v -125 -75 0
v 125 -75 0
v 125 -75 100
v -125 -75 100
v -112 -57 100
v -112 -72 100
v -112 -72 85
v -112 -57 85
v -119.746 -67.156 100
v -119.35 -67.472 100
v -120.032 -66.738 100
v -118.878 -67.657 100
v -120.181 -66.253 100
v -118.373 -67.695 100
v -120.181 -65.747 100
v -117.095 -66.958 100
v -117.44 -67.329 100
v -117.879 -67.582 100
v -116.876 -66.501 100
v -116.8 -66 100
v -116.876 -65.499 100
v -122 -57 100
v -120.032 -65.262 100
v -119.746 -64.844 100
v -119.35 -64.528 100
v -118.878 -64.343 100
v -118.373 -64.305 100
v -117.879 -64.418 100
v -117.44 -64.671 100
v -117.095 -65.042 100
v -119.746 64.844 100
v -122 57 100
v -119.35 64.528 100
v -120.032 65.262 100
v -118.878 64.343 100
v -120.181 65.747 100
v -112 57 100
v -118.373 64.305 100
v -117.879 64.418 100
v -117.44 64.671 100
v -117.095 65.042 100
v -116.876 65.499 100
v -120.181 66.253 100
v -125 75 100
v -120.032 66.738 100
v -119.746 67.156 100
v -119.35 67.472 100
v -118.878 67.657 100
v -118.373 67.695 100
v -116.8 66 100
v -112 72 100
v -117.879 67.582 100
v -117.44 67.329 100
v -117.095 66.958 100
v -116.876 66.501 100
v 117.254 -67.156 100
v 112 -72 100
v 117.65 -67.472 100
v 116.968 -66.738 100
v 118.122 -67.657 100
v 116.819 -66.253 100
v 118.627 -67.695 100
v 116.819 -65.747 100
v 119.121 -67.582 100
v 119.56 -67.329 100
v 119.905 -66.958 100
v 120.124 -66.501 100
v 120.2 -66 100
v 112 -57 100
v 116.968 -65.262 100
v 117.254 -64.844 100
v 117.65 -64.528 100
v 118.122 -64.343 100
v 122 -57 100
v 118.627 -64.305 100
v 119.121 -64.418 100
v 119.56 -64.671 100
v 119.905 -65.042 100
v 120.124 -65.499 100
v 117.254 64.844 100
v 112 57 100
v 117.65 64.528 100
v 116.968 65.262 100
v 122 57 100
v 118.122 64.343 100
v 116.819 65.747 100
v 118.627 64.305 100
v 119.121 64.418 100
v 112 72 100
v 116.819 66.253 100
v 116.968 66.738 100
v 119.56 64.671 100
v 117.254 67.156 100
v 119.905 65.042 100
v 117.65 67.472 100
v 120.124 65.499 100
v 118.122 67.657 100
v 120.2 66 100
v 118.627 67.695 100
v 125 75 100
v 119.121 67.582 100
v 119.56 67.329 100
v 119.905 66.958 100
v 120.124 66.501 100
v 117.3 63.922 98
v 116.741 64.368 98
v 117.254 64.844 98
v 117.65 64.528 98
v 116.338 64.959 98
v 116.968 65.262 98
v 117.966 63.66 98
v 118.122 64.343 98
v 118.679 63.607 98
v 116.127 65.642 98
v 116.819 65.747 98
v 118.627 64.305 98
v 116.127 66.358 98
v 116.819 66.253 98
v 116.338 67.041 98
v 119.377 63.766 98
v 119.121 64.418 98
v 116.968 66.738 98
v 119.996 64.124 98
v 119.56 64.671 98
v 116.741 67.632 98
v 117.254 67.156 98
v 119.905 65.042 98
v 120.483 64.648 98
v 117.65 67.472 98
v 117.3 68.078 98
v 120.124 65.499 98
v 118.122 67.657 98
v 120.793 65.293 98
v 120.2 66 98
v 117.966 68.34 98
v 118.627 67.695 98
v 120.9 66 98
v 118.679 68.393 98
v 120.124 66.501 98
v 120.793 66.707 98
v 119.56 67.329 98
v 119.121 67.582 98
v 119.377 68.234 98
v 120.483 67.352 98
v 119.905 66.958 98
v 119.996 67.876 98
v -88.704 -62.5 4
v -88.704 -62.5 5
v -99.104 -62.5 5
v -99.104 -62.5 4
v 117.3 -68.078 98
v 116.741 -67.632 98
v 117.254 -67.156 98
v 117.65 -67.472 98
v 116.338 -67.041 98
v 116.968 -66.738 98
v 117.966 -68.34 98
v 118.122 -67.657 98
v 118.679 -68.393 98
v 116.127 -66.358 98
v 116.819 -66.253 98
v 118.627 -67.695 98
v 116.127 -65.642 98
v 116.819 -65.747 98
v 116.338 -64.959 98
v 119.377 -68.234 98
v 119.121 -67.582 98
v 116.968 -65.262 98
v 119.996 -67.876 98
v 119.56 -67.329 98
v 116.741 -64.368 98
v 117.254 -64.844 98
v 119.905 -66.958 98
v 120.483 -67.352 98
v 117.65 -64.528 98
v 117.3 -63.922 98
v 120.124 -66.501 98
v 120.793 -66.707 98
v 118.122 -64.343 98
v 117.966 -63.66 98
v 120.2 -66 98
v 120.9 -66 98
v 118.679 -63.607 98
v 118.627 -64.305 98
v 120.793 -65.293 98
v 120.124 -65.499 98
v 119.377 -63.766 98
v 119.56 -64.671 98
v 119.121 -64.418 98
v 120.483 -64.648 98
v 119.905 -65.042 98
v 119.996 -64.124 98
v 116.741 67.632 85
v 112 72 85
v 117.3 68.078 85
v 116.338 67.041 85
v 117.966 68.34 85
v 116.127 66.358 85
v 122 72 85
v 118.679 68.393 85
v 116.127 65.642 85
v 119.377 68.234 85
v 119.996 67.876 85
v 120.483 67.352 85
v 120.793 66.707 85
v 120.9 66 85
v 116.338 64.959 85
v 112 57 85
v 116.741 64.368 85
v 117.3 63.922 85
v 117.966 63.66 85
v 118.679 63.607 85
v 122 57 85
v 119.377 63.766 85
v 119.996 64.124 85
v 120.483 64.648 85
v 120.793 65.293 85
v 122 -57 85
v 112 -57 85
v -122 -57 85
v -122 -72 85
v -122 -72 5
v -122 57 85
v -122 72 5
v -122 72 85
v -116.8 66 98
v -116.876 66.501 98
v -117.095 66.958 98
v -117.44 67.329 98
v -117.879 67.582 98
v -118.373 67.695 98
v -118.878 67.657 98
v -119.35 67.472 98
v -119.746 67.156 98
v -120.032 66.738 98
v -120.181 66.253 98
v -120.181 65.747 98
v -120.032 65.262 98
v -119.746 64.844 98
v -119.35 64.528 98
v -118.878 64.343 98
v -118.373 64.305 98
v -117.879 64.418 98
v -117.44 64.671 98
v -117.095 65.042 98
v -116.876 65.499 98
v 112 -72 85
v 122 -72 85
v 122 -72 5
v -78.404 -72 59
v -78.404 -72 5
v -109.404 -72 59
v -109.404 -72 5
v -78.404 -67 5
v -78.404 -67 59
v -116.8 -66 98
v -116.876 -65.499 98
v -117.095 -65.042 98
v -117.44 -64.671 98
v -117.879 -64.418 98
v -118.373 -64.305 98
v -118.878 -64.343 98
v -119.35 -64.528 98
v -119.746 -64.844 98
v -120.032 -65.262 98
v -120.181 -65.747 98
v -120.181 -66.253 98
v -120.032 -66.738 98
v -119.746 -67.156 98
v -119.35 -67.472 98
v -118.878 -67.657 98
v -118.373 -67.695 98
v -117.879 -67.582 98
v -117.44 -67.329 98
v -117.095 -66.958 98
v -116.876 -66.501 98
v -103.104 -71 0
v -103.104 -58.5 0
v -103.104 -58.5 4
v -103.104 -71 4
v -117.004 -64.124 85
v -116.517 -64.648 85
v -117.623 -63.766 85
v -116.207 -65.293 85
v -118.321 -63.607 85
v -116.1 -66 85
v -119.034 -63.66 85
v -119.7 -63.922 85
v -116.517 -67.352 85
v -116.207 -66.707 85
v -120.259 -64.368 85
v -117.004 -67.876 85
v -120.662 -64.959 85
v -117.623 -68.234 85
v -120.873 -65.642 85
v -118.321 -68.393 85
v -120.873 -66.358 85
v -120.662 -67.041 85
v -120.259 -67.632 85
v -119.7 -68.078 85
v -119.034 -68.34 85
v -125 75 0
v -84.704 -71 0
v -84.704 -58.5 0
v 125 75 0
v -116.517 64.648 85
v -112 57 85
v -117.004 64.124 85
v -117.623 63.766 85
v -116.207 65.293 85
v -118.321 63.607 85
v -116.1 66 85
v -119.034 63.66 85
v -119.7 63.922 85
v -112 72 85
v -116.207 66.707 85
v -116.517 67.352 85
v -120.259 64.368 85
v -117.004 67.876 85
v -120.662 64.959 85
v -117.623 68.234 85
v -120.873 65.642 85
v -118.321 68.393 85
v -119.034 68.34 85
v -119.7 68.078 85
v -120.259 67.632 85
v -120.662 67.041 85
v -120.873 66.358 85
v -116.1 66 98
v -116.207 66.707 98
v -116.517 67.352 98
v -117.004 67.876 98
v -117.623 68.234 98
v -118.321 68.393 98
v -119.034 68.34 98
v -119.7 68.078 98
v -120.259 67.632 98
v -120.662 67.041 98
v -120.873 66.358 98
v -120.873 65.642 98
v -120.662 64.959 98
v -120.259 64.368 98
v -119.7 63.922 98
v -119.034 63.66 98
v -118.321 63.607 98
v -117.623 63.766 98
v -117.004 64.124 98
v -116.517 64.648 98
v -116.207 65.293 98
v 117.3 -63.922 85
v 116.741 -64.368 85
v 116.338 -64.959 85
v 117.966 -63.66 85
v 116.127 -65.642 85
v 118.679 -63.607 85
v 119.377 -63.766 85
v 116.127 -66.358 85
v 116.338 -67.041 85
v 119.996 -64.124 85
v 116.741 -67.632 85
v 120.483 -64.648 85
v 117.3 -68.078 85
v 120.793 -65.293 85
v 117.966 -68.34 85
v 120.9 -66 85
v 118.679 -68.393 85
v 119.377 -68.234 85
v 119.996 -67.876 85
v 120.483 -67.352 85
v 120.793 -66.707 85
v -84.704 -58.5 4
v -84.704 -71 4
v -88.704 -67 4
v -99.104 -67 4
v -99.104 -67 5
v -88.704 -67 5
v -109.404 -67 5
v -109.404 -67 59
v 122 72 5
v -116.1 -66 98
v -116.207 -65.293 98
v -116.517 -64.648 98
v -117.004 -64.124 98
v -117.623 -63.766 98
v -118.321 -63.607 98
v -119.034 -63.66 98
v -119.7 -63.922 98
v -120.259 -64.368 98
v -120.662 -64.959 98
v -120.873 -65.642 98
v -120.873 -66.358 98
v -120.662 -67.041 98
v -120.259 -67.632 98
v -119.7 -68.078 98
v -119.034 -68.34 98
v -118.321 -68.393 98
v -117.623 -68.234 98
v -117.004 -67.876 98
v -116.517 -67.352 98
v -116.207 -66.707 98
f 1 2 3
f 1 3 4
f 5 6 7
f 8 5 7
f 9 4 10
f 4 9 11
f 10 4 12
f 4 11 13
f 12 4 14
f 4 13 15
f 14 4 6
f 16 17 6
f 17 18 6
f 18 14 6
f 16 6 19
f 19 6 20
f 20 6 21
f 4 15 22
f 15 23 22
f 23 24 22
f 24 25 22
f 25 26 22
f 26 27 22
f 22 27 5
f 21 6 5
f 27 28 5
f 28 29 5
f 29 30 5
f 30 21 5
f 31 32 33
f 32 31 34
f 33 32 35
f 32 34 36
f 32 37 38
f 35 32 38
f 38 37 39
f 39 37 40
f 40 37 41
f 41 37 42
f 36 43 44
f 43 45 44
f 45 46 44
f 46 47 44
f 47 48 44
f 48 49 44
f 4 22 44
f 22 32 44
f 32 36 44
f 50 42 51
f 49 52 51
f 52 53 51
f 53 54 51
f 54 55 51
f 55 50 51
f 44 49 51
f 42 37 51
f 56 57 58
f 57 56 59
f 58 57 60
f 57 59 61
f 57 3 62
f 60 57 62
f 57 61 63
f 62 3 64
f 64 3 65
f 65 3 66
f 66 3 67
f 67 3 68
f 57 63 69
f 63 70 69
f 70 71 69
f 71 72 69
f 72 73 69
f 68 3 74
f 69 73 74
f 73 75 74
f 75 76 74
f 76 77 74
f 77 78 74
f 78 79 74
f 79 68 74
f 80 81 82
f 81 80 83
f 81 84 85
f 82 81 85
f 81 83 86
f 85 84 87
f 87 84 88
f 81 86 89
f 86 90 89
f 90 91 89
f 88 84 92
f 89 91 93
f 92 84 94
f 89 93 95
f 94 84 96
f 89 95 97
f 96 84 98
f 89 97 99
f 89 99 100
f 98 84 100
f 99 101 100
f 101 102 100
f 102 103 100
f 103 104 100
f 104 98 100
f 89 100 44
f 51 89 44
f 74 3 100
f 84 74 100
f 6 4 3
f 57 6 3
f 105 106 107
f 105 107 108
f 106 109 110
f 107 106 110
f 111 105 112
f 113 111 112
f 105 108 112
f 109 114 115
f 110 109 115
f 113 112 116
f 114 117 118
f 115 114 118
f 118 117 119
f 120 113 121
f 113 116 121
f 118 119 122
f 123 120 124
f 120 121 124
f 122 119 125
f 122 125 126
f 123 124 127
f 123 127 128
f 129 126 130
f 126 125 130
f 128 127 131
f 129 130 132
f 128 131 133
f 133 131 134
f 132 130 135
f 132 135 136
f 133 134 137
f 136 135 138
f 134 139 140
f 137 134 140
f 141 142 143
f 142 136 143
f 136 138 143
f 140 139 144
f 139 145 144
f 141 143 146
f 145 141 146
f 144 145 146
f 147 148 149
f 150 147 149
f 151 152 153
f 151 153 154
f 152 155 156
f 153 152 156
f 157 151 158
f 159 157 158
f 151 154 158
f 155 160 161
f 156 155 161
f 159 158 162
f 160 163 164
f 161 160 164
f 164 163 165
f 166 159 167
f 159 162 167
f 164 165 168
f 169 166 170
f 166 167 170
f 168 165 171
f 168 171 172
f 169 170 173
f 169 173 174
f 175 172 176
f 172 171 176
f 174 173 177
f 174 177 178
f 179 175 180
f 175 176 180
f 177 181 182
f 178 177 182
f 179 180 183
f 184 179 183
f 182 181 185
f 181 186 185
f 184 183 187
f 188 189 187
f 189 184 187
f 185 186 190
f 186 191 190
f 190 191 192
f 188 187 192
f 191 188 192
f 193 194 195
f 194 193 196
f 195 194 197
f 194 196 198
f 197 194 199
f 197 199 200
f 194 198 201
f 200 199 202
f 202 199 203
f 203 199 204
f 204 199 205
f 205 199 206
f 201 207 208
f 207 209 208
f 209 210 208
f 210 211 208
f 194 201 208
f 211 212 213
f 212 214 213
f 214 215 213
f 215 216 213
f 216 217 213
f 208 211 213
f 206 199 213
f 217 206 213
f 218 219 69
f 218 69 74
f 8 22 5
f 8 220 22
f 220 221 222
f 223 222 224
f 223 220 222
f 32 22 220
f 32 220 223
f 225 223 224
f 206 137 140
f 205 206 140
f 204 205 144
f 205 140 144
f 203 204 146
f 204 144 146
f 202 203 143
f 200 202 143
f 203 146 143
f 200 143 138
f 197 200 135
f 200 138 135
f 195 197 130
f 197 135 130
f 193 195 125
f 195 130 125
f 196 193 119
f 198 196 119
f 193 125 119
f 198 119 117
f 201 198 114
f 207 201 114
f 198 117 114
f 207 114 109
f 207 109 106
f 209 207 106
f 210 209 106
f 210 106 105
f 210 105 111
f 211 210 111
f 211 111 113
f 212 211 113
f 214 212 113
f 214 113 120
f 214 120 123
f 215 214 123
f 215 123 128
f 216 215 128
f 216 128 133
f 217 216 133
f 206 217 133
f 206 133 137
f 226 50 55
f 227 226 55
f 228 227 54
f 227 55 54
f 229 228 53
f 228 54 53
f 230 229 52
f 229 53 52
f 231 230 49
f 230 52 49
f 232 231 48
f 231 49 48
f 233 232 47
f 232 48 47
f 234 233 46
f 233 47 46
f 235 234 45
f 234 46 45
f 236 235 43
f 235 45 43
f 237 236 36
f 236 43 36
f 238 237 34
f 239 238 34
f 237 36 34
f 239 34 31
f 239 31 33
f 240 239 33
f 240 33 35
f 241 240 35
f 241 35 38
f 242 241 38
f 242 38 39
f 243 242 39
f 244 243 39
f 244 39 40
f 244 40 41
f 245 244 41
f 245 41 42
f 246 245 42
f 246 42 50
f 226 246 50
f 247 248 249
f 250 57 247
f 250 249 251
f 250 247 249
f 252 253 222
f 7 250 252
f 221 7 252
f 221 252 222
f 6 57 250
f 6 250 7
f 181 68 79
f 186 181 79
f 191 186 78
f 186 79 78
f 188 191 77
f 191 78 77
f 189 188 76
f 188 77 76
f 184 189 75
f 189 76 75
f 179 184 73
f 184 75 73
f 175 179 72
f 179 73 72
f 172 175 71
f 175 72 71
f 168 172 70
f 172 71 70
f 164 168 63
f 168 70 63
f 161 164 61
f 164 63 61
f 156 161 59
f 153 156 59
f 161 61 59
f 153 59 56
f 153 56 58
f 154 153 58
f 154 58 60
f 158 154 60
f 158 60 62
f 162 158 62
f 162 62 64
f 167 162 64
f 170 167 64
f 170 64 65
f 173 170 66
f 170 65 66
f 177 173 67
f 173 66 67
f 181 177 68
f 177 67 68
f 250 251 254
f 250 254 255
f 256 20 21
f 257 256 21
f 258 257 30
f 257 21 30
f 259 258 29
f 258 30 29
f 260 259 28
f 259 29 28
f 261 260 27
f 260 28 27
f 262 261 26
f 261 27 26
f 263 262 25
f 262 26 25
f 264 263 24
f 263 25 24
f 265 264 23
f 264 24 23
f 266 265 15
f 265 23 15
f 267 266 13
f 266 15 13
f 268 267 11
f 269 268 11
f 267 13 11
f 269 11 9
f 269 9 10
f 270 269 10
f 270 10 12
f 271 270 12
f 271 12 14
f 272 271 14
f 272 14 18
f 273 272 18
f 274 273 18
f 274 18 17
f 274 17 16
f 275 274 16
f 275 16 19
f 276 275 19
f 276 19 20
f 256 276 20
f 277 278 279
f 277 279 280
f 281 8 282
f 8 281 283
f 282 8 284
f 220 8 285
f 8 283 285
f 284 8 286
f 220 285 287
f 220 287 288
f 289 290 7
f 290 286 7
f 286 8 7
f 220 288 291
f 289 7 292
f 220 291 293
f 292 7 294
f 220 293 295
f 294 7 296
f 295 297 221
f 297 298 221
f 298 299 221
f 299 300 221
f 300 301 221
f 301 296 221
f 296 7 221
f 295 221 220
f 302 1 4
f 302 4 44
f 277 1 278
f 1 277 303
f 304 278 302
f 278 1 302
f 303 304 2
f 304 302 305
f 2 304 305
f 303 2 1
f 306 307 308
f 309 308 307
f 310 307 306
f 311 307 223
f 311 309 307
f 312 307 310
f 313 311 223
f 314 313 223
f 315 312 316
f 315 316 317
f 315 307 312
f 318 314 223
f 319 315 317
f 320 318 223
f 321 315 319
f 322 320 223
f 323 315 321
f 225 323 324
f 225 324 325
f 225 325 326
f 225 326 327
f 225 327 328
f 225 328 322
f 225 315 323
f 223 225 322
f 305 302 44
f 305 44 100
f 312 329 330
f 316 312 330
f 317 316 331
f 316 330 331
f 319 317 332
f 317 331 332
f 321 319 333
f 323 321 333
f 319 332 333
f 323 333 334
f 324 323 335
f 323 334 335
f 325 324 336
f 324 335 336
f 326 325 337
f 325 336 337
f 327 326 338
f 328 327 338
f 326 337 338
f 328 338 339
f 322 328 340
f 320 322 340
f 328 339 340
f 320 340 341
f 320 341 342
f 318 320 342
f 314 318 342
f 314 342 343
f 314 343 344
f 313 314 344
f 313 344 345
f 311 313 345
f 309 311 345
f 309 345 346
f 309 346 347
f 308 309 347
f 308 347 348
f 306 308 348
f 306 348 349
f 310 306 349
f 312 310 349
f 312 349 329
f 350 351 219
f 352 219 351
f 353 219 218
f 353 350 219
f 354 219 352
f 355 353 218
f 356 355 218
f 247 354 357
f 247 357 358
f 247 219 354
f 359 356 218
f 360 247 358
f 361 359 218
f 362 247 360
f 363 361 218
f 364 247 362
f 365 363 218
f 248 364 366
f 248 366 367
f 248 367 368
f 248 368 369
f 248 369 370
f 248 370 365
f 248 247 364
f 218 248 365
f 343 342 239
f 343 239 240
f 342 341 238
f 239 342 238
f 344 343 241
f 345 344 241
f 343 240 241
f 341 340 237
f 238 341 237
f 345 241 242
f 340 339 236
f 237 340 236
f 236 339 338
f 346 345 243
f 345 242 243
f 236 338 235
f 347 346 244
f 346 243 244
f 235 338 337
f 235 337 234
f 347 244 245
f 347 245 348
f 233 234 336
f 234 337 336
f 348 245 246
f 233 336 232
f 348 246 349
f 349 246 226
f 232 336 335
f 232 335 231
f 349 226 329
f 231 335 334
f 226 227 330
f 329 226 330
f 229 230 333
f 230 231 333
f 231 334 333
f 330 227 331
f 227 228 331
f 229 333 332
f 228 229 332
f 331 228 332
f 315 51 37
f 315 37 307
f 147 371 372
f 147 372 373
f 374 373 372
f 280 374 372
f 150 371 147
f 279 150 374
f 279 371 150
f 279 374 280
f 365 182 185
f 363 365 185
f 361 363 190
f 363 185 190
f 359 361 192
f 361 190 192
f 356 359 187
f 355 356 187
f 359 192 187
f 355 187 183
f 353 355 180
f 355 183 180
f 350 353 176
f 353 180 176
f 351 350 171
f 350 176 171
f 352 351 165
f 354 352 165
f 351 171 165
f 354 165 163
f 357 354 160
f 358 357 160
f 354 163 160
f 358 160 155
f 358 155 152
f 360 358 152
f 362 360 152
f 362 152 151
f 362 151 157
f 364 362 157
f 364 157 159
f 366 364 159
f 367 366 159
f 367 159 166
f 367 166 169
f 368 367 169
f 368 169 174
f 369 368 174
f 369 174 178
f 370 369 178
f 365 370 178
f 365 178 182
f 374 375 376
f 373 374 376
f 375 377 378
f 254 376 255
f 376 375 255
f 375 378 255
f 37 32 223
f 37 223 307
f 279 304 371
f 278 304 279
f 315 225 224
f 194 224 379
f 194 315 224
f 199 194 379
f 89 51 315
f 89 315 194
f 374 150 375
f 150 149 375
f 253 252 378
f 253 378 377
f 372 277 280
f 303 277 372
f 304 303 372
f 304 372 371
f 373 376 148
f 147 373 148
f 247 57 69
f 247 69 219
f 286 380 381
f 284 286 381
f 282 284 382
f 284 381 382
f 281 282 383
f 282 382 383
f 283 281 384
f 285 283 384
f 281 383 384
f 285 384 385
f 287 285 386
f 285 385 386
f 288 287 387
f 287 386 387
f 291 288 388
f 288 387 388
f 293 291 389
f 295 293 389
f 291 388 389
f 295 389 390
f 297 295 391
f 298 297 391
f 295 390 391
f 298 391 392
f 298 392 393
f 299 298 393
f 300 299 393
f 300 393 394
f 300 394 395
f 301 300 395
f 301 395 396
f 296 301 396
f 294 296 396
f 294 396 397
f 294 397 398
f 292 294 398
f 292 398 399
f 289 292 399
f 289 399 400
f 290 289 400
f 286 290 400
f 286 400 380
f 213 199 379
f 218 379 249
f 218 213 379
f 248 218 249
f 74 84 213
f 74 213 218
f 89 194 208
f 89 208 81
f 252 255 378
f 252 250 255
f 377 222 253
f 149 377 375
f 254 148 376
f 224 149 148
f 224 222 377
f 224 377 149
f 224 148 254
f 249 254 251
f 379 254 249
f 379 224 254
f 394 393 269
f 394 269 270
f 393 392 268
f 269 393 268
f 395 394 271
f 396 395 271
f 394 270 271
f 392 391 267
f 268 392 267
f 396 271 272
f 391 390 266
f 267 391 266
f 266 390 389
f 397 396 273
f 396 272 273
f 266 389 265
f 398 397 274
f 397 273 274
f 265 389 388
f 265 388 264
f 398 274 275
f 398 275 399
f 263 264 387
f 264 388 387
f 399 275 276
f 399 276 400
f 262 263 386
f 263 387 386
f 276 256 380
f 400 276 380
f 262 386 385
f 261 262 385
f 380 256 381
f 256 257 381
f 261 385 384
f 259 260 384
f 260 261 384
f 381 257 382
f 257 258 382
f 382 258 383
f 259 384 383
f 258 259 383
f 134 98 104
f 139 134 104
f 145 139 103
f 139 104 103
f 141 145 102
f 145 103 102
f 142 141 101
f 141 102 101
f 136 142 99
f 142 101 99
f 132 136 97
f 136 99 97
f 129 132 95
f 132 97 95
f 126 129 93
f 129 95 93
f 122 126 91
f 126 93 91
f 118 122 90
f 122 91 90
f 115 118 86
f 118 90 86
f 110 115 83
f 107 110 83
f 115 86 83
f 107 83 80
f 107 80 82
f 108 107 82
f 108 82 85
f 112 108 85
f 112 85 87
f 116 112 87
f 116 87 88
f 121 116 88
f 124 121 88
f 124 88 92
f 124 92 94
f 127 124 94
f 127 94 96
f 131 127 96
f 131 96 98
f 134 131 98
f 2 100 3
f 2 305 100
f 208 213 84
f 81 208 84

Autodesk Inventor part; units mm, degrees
ref_plane "YZ Plane" through (0, 0, 0) normal (1, 0, 0) x (0, 1, 0)
ref_plane "XZ Plane" through (0, 0, 0) normal (0, 1, 0) x (-1, 0, 0)
ref_plane "XY Plane" through (0, 0, 0) normal (0, 0, 1) x (1, 0, 0)
sketch "Sketch7" plane through (0, 0, 0) normal (0, 0, 1) x (1, 0, 0)
  line L0 (125, -75) -> (-125, -75)
  line L1 (-125, -75) -> (-125, 75)
  line L2 (-125, 75) -> (125, 75)
  line L3 (125, 75) -> (125, -75)
  line L4 (125, -75) -> (-125, 75) construction
  line L5 (-125, -75) -> (125, 75) construction
  point P0 (0, 0)
  dimension "d15" = 250
  dimension "d16" = 150
extrude "Box Outside" add sketch "Sketch7" along normal blind 100
sketch "Sketch8" plane through (0, 0, 100) normal (0, 0, 1) x (1, 0, 0)
  line L0 (-122, 72) -> (122, 72)
  line L1 (122, 72) -> (122, -72)
  line L2 (122, -72) -> (-122, -72)
  line L3 (-122, -72) -> (-122, 72)
  line L4 (125, 75) -> (-125, 75) projected
  line L5 (-125, 75) -> (-125, -75) projected
  line L6 (-125, -75) -> (125, -75) projected
  line L7 (125, -75) -> (125, 75) projected
  point P0 (0, 0)
  dimension "d19" = 3
  dimension "d20" = 3
  dimension "d21" = 3
  dimension "d22" = 3
extrude "Box Cut" cut sketch "Sketch8" against normal blind 95 contours L0 L1 L2 L3
sketch "Sketch9" plane through (-122, -72, 100) normal (0, 1, 0) x (1, 0, 0)
  line L0 (0, 0) -> (10, 0)
  line L1 (10, 0) -> (10, 15)
  line L2 (10, 15) -> (0, 15)
  line L3 (0, 15) -> (0, 0)
  point P0 (122, 100)
  dimension "d25" = 10
  dimension "d26" = 15
extrude "ScrewHole Box LB" add sketch "Sketch9" along normal blind 15
sketch "Sketch10" plane through (-122, -72, 5) normal (0, 1, 0) x (1, 0, 0)
  line L0 (244, -95) -> (244, 0) projected
  line L1 (244, -95) -> (234, -95)
  line L2 (234, -95) -> (234, -80)
  line L3 (234, -80) -> (244, -80)
  line L4 (244, -80) -> (244, -95)
  point P0 (122, 5)
  dimension "d29" = 10
  dimension "d30" = 15
extrude "ScrewHole Box RB" add sketch "Sketch10" along normal blind 15
sketch "Sketch11" plane through (-122, 72, 100) normal (0, -1, 0) x (1, 0, 0)
  line L0 (0, 0) -> (244, 0) projected
  line L1 (0, 0) -> (10, 0)
  line L2 (10, 0) -> (10, -15)
  line L3 (10, -15) -> (0, -15)
  line L4 (0, -15) -> (0, 0)
  point P0 (122, -100)
  dimension "d33" = 10
  dimension "d34" = 15
extrude "ScrewHole Box LU" add sketch "Sketch11" along normal blind 15
sketch "Sketch13" plane through (122, -72, 5) normal (-1, 0, 0) x (0, 0, 1)
  line L0 (95, 144) -> (0, 144) projected
  line L1 (95, 144) -> (80, 144)
  line L2 (80, 144) -> (80, 129)
  line L3 (80, 129) -> (95, 129)
  line L4 (95, 129) -> (95, 144)
  point P0 (-5, 72)
  dimension "d37" = 15
  dimension "d38" = 15
extrude "ScrewHole Box RU" add sketch "Sketch13" along normal blind 10
sketch "Sketch27" plane through (0, 0, 100) normal (0, 0, 1) x (1, 0, 0)
  line L0 (-112, -72) -> (-112, -57) projected
  line L1 (-125, 75) -> (-125, -75) projected
  line L2 (-112, -57) -> (-125, -57)
  line L3 (-125, -57) -> (-125, -75)
  line L4 (-125, -75) -> (-112, -75)
  line L5 (-112, -75) -> (-112, -57)
  line L6 (-112, -57) -> (-125, -75)
  line L7 (-112, -75) -> (-125, -57)
  circle A0 centre (-118.5, -66) radius 2.4
  point P0 (0, 0)
  dimension "d84" = 4.8
extrude "Outside ScrewHole LB" cut sketch "Sketch27" against normal blind 26 contours A0 L7 L6 | L6 L7 A0 | A0 L6 L7 | L7 L6 A0
sketch "Sketch29" plane through (0, 0, 100) normal (0, 0, 1) x (1, 0, 0)
  line L0 (-112, -72) -> (-112, -57) projected
  line L1 (-125, -75) -> (125, -75) projected
  line L2 (-112, -57) -> (-125, -57)
  line L3 (-125, -57) -> (-125, -75)
  line L4 (-125, -75) -> (-112, -75)
  line L5 (-112, -75) -> (-112, -57)
  line L6 (-112, -57) -> (-125, -75)
  circle A0 centre (-118.5, -66) radius 2.4
  point P0 (0, 0)
extrude "ScrewRibbon LB" add sketch "Sketch29" against normal blind 2 contours A0 L6 | L6 A0
sketch "Sketch30" plane through (0, 0, 100) normal (0, 0, 1) x (1, 0, 0)
  line L0 (-122, -57) -> (-112, -57) projected
  line L1 (-125, -75) -> (125, -75) projected
  line L2 (-112, -57) -> (-125, -57)
  line L3 (-125, -57) -> (-125, -75)
  line L4 (-125, -75) -> (-112, -75)
  line L5 (-112, -75) -> (-112, -57)
  line L6 (-112, -57) -> (-125, -75)
  circle A0 centre (-118.5, -66) radius 1.7
  point P0 (0, 0)
  dimension "d92" = 3.4
extrude "Inside ScrewHole LB" cut sketch "Sketch30" against normal blind 24 contours A0 L6 | L6 A0
sketch "Sketch31" plane through (0, 0, 100) normal (0, 0, 1) x (1, 0, 0)
  line L0 (-125, 75) -> (-125, -75) projected
  line L1 (-112, 57) -> (-122, 57) projected
  line L2 (-125, 75) -> (-112, 75)
  line L3 (-112, 75) -> (-112, 57)
  line L4 (-112, 57) -> (-125, 57)
  line L5 (-125, 57) -> (-125, 75)
  line L6 (-125, 75) -> (-112, 57)
  circle A0 centre (-118.5, 66) radius 2.4
  point P0 (0, 0)
  dimension "d95" = 4.8
extrude "Outside ScrewHole LU" cut sketch "Sketch31" against normal blind 24 contours A0 L6 | L6 A0
sketch "Sketch32" plane through (0, 0, 100) normal (0, 0, 1) x (1, 0, 0)
  line L0 (-122, 57) -> (-112, 57) projected
  line L1 (-125, 75) -> (-125, -75) projected
  line L2 (-112, 57) -> (-125, 57)
  line L3 (-125, 57) -> (-125, 75)
  line L4 (-125, 75) -> (-112, 75)
  line L5 (-112, 75) -> (-112, 57)
  line L6 (-112, 75) -> (-125, 57)
  circle A0 centre (-118.5, 66) radius 2.4
  point P0 (0, 0)
  dimension "d98" = 4.8
extrude "ScrewRibbon LU" add sketch "Sketch32" against normal blind 2 contours A0 L6 | L6 A0
sketch "Sketch33" plane through (0, 0, 100) normal (0, 0, 1) x (1, 0, 0)
  line L0 (125, 75) -> (-125, 75) projected
  line L1 (-112, 57) -> (-122, 57) projected
  line L2 (-125, 75) -> (-112, 75)
  line L3 (-112, 75) -> (-112, 57)
  line L4 (-112, 57) -> (-125, 57)
  line L5 (-125, 57) -> (-125, 75)
  line L6 (-125, 75) -> (-112, 57)
  circle A0 centre (-118.5, 66) radius 1.7
  point P0 (0, 0)
  dimension "d101" = 3.4
extrude "Inside ScrewHole LU" cut sketch "Sketch33" against normal blind 21.75 contours A0 L6 | L6 A0
sketch "Sketch34" plane through (0, 0, 100) normal (0, 0, 1) x (1, 0, 0)
  line L0 (112, 57) -> (112, 72) projected
  line L1 (125, 75) -> (-125, 75) projected
  line L2 (112, 57) -> (125, 57)
  line L3 (125, 57) -> (125, 75)
  line L4 (125, 75) -> (112, 75)
  line L5 (112, 75) -> (112, 57)
  line L6 (125, 75) -> (112, 57)
  circle A0 centre (118.5, 66) radius 2.4
  point P0 (0, 0)
  dimension "d104" = 4.8
extrude "Outside ScrewHole RU" cut sketch "Sketch34" against normal blind 21.75 contours A0 L6 | L6 A0
sketch "Sketch35" plane through (0, 0, 100) normal (0, 0, 1) x (1, 0, 0)
  line L0 (125, -75) -> (125, 75) projected
  line L1 (122, 57) -> (112, 57) projected
  line L2 (125, 75) -> (112, 75)
  line L3 (112, 75) -> (112, 57)
  line L4 (112, 57) -> (125, 57)
  line L5 (125, 57) -> (125, 75)
  line L6 (125, 75) -> (-125, 75) projected
  line L7 (125, 75) -> (112, 57)
  circle A0 centre (118.5, 66) radius 2.4
  point P0 (0, 0)
  dimension "d107" = 4.8
extrude "ScrewRibbon RU" add sketch "Sketch35" against normal blind 2 contours A0 L7 | L7 A0
sketch "Sketch36" plane through (0, 0, 100) normal (0, 0, 1) x (1, 0, 0)
  line L0 (122, 57) -> (112, 57) projected
  line L1 (125, -75) -> (125, 75) projected
  line L2 (112, 57) -> (125, 57)
  line L3 (125, 57) -> (125, 75)
  line L4 (125, 75) -> (112, 75)
  line L5 (112, 75) -> (112, 57)
  line L6 (112, 57) -> (125, 75)
  circle A0 centre (118.5, 66) radius 2.4 projected
  circle A1 centre (118.5, 66) radius 1.7
  point P0 (0, 0)
  dimension "d110" = 3.4
extrude "Inside ScrewHole RU" cut sketch "Sketch36" against normal blind 20 contours A1 L6 | L6 A1
sketch "Sketch37" plane through (0, 0, 100) normal (0, 0, 1) x (1, 0, 0)
  line L0 (125, -75) -> (125, 75) projected
  line L1 (112, -72) -> (112, -57) projected
  line L2 (125, -75) -> (112, -75)
  line L3 (112, -75) -> (112, -57)
  line L4 (112, -57) -> (125, -57)
  line L5 (125, -57) -> (125, -75)
  line L6 (112, -75) -> (125, -57)
  circle A0 centre (118.5, -66) radius 2.4
  point P0 (0, 0)
  dimension "d113" = 4.8
extrude "Outside ScrewHole RB" cut sketch "Sketch37" against normal blind 20 contours A0 L6 | L6 A0
sketch "Sketch38" plane through (0, 0, 100) normal (0, 0, 1) x (1, 0, 0)
  line L0 (122, -57) -> (112, -57) projected
  line L1 (125, -75) -> (125, 75) projected
  line L2 (112, -57) -> (125, -57)
  line L3 (125, -57) -> (125, -75)
  line L4 (125, -75) -> (112, -75)
  line L5 (112, -75) -> (112, -57)
  line L6 (125, -57) -> (112, -75)
  circle A0 centre (118.5, -66) radius 2.4
  point P0 (0, 0)
  dimension "d116" = 4.8
extrude "ScrewRibbon RB" add sketch "Sketch38" against normal blind 2 contours A0 L6 | L6 A0
sketch "Sketch39" plane through (0, 0, 100) normal (0, 0, 1) x (1, 0, 0)
  line L0 (112, -72) -> (112, -57) projected
  line L1 (125, -75) -> (125, 75) projected
  line L2 (112, -57) -> (125, -57)
  line L3 (125, -57) -> (125, -75)
  line L4 (125, -75) -> (112, -75)
  line L5 (112, -75) -> (112, -57)
  line L6 (112, -75) -> (125, -57)
  circle A0 centre (118.5, -66) radius 2.4 projected
  circle A1 centre (118.5, -66) radius 1.7
  point P0 (0, 0)
  dimension "d119" = 3.4
extrude "Inside ScrewHole RB" cut sketch "Sketch39" against normal blind 20 contours A1 L6 | L6 A1
sketch "Sketch42" plane through (-122, -72, 5) normal (0, 1, 0) x (1, 0, 0)
  line L0 (244, 0) -> (0, 0) projected
  line L1 (12.5963, 0) -> (43.5963, 0)
  line L2 (43.5963, 0) -> (43.5963, -54)
  line L3 (43.5963, -54) -> (12.5963, -54)
  line L4 (12.5963, -54) -> (12.5963, 0)
  point P0 (122, 5)
  point P1 (43.5963, 0)
  dimension "d134" = 31
  dimension "d135" = 54
extrude "ESPHolder" add sketch "Sketch42" along normal blind 5
sketch "Sketch43" plane through (0, 0, 5) normal (0, 0, 1) x (1, 0, 0)
  line L0 (-109.4037, -67) -> (-78.4037, -67) projected
  line L1 (-99.1037, -67) -> (-88.7037, -67)
  line L2 (-88.7037, -67) -> (-88.7037, -62.5)
  line L3 (-88.7037, -62.5) -> (-99.1037, -62.5)
  line L4 (-99.1037, -62.5) -> (-99.1037, -67)
  line L5 (-78.4037, -67) -> (-109.4037, -67)
  line L6 (-109.4037, -67) -> (-109.4037, -51.7804)
  line L7 (-109.4037, -51.7804) -> (-78.4037, -51.7804)
  line L8 (-78.4037, -51.7804) -> (-78.4037, -67)
  point P0 (0, 0)
  dimension "d138" = 10.3
  dimension "d139" = 10.3
  dimension "d140" = 4.5
extrude "PortHole" cut sketch "Sketch43" against normal through all contours L4 L3 L2 L0
sketch "Sketch44" plane through (0, 0, 0) normal (0, 0, -1) x (-1, 0, 0)
  line L0 (84.7037, -58.5) -> (103.1037, -58.5)
  line L1 (103.1037, -58.5) -> (103.1037, -71)
  line L2 (103.1037, -71) -> (84.7037, -71)
  line L3 (84.7037, -71) -> (84.7037, -58.5)
  line L4 (88.7037, -62.5) -> (99.1037, -62.5) projected
  line L5 (99.1037, -67) -> (88.7037, -67) projected
  line L6 (99.1037, -62.5) -> (99.1037, -67) projected
  line L7 (88.7037, -67) -> (88.7037, -62.5) projected
  point P0 (0, 0)
  dimension "d143" = 4
  dimension "d144" = 4
  dimension "d145" = 4
  dimension "d146" = 4
extrude "Extrusion29" cut sketch "Sketch44" against normal blind 4
properties part number "Box"
